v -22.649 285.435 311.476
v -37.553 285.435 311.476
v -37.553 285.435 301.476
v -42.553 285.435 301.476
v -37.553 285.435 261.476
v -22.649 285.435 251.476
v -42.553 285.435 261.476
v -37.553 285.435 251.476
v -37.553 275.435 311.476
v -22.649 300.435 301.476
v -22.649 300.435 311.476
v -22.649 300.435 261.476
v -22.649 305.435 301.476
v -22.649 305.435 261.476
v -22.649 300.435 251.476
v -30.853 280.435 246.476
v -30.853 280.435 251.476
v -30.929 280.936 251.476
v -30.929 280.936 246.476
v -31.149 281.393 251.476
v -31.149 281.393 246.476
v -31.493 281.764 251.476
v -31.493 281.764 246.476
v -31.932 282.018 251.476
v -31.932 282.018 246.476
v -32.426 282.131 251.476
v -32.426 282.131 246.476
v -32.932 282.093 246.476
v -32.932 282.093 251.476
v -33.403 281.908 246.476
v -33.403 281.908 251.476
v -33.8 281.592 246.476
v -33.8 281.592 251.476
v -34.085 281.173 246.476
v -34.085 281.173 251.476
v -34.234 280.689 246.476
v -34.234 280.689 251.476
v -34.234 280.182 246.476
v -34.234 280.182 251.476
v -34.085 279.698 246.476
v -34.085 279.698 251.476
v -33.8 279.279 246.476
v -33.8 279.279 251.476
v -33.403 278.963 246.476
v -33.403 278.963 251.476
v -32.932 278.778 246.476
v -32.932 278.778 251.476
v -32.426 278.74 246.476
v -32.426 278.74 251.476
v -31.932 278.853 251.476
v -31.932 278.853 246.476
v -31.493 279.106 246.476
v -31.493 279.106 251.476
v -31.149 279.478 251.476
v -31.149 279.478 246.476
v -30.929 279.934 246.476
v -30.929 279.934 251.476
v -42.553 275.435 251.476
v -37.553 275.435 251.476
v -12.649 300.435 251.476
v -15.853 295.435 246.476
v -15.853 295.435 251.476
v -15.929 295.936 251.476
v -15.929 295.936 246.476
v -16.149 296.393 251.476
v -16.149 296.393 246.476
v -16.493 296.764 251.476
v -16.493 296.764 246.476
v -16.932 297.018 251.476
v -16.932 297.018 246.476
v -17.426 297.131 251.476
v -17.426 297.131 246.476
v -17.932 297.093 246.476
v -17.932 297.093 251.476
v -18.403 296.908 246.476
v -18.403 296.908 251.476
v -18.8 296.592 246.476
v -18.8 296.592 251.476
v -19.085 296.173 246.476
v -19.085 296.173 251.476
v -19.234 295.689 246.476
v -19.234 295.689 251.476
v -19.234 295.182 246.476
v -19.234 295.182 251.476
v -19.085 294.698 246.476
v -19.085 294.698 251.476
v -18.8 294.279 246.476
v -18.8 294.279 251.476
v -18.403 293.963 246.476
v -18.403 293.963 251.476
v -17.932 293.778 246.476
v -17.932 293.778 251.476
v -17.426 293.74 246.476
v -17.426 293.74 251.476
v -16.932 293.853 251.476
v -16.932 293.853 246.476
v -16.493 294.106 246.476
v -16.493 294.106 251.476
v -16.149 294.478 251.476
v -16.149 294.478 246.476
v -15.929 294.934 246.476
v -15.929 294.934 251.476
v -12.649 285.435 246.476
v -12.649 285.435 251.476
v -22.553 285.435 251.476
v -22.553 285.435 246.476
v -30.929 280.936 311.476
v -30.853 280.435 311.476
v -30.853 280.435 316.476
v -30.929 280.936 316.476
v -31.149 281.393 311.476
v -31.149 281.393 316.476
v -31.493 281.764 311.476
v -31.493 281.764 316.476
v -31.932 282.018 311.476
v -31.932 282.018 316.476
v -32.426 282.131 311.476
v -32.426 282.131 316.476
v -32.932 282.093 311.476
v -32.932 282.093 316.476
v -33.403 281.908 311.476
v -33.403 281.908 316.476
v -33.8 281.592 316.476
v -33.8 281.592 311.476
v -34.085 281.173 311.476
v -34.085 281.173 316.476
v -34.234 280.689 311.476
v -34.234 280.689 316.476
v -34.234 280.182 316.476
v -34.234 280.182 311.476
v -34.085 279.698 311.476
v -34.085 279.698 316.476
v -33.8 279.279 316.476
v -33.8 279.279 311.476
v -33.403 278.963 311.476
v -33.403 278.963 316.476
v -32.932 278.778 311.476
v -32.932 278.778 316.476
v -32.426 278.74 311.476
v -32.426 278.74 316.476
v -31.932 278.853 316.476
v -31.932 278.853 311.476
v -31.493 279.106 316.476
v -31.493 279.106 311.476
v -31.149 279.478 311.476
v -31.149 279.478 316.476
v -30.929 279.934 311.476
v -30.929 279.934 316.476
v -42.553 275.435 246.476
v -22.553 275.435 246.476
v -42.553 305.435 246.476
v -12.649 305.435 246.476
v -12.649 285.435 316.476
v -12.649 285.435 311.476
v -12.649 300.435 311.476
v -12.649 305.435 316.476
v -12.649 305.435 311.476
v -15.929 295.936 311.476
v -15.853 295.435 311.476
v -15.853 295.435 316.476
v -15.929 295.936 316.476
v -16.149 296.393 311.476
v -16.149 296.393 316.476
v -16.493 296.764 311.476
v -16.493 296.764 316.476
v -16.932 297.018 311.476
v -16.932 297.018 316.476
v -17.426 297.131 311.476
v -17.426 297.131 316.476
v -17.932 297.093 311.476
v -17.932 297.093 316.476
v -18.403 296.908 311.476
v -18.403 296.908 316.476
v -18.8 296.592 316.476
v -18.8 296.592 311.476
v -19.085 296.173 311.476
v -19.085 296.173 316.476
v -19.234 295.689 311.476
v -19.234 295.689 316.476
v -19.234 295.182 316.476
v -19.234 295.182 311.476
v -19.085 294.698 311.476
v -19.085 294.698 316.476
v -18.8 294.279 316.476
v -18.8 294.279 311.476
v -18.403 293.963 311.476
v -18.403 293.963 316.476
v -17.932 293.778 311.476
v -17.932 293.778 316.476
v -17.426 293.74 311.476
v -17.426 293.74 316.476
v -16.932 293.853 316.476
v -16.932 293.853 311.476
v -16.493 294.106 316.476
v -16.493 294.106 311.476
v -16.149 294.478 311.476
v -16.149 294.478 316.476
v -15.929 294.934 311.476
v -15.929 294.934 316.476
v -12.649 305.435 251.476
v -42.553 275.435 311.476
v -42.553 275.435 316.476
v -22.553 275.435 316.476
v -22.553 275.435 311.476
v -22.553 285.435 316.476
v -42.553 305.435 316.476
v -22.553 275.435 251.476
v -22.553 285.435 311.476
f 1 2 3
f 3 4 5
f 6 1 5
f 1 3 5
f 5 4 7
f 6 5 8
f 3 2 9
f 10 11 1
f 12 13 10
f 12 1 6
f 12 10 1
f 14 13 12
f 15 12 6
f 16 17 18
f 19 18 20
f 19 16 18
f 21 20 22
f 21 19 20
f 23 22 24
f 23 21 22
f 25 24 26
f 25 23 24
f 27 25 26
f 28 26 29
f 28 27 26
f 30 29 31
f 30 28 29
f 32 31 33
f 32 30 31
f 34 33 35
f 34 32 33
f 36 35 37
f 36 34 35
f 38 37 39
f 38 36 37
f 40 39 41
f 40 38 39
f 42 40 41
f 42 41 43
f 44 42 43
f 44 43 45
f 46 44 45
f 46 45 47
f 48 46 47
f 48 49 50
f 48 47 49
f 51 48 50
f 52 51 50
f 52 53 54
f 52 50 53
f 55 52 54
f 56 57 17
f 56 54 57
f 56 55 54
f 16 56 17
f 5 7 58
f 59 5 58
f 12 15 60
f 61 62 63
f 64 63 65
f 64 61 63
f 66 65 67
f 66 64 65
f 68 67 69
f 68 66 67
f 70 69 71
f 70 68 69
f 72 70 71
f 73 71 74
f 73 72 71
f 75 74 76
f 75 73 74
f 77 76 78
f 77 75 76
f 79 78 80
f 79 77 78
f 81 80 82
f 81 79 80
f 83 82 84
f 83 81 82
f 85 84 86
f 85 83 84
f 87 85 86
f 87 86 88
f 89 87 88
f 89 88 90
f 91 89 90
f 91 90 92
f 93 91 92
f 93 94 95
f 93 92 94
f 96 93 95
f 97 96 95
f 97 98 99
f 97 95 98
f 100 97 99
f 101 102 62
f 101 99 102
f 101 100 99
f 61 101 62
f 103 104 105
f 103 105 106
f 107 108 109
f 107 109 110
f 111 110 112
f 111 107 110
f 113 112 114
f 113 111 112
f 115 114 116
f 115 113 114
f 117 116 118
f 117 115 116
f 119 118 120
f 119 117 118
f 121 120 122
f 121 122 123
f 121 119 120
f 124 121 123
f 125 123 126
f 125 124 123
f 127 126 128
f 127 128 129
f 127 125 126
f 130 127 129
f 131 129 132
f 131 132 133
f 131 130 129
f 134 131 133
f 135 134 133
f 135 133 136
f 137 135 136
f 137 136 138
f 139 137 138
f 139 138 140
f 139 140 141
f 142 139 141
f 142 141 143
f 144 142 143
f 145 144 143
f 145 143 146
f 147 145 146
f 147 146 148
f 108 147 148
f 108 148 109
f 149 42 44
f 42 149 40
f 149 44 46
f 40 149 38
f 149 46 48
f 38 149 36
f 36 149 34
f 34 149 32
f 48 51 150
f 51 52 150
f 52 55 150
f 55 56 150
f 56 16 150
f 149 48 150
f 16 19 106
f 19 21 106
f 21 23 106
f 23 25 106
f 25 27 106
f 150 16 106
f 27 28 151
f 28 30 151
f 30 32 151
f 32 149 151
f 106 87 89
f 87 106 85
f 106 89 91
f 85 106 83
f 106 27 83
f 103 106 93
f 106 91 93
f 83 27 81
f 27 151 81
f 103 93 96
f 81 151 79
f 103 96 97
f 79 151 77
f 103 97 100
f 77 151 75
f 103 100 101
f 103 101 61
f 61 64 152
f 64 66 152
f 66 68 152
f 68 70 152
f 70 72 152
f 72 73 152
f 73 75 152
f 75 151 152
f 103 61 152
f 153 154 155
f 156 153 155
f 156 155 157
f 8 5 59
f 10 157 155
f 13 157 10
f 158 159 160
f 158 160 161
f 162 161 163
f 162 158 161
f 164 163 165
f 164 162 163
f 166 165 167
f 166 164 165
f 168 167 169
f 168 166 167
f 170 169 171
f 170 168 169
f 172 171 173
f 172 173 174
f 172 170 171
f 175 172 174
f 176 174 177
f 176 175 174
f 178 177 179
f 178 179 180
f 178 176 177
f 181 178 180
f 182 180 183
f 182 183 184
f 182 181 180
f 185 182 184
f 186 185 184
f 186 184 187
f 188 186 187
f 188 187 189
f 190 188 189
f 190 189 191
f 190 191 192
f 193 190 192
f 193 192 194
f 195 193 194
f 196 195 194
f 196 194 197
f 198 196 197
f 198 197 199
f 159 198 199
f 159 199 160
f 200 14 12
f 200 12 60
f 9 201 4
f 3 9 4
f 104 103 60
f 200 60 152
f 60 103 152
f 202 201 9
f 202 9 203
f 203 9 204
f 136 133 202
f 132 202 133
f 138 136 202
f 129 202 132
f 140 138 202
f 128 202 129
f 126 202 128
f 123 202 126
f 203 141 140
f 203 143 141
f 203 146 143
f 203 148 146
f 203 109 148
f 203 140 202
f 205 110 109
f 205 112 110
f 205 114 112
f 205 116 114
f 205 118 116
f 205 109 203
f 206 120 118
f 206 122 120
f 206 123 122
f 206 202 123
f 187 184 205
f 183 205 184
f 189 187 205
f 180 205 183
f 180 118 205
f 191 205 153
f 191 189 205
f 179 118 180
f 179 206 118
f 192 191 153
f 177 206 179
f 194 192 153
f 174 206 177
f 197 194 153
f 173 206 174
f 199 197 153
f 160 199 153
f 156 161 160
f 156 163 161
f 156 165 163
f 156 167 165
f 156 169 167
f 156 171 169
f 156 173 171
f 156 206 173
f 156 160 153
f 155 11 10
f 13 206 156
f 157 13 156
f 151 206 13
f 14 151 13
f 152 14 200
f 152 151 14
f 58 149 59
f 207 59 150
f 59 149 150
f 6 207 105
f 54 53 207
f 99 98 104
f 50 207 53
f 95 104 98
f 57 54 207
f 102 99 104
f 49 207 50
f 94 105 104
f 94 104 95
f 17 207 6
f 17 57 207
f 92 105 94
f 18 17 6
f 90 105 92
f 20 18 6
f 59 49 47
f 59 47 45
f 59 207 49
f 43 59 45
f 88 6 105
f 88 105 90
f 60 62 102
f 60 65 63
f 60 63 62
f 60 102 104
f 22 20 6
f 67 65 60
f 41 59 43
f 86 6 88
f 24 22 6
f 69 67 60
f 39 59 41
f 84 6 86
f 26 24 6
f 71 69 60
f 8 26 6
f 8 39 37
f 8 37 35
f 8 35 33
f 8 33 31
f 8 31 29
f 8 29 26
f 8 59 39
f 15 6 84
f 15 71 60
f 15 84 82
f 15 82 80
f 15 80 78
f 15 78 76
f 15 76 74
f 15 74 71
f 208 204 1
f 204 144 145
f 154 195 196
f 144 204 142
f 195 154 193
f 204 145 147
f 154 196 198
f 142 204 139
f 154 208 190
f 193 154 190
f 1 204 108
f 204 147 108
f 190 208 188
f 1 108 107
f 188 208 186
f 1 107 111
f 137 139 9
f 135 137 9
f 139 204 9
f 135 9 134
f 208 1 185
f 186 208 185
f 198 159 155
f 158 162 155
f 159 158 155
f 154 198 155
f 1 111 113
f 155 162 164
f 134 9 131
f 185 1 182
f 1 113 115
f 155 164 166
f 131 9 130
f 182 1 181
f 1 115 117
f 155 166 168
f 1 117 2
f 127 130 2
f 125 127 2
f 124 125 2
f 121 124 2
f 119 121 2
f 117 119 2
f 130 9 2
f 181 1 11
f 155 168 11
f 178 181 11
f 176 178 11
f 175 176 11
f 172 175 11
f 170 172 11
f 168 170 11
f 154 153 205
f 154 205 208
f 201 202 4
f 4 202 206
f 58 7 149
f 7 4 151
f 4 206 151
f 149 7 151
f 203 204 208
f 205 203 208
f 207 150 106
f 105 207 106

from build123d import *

# Parameters (mm, degrees)
SKETCH1_R           = 1.7
BOSS_EXTRUDE1_DEPTH = 70
SKETCH2_W           = 60
SKETCH2_H           = 10
CUT_EXTRUDE1_DEPTH  = 25
BOSS_EXTRUDE2_DEPTH = 5
SKETCH4_W           = 10
SKETCH4_H           = 60
CUT_EXTRUDE2_DEPTH  = 20
BOSS_EXTRUDE3_DEPTH = 5


with BuildPart() as part:
    # Sketch1 → Boss-Extrude1 (new body)
    with BuildSketch(Plane.XY.offset(246.476360497)):
        Polygon((-42.55341426, 305.4352577), (-42.55341426, 275.4352577), (-22.55341426, 275.4352577), (-22.55341426, 285.4352577), (-12.649269186, 285.4352577), (-12.649269186, 305.4352577), align=None)
        with Locations((-17.55341426, 295.4352577)):
            Circle(SKETCH1_R, mode=Mode.SUBTRACT)
        with Locations((-32.55341426, 280.4352577)):
            Circle(SKETCH1_R, mode=Mode.SUBTRACT)
    extrude(amount=BOSS_EXTRUDE1_DEPTH)

    # Sketch2 → Cut-Extrude1 (cut)
    with BuildSketch(Plane.ZY.offset(42.55341426)):
        with Locations((281.476360497, 280.4352577)):
            Rectangle(SKETCH2_W, SKETCH2_H)
    extrude(amount=-CUT_EXTRUDE1_DEPTH, mode=Mode.SUBTRACT)

    # Sketch3 → Boss-Extrude2 (add)
    with BuildSketch(Plane.ZY.offset(42.55341426)):
        Polygon((311.476360497, 275.4352577), (301.476360497, 285.4352577), (261.476360497, 285.4352577), (251.476360497, 275.4352577), (246.476360497, 275.4352577), (246.476360497, 305.4352577), (316.476360497, 305.4352577), (316.476360497, 275.4352577), align=None)
    extrude(amount=-BOSS_EXTRUDE2_DEPTH)

    # Sketch4 → Cut-Extrude2 (cut)
    with BuildSketch(Plane(origin=(0, 305.4352577, 0), x_dir=(1, 0, 0), z_dir=(0, 1, 0))):
        with Locations((-17.649269186, -281.476360497)):
            Rectangle(SKETCH4_W, SKETCH4_H)
    extrude(amount=-CUT_EXTRUDE2_DEPTH, mode=Mode.SUBTRACT)

    # Sketch5 → Boss-Extrude3 (add)
    with BuildSketch(Plane(origin=(0, 305.4352577, 0), x_dir=(1, 0, 0), z_dir=(0, 1, 0))):
        Polygon((-12.649269186, -311.476360497), (-22.649269186, -301.476360497), (-22.649269186, -261.476360497), (-12.649269186, -251.476360497), (-12.649269186, -246.476360497), (-42.55341426, -246.476360497), (-42.55341426, -316.476360497), (-12.649269186, -316.476360497), align=None)
    extrude(amount=-BOSS_EXTRUDE3_DEPTH)


solid = part.part
